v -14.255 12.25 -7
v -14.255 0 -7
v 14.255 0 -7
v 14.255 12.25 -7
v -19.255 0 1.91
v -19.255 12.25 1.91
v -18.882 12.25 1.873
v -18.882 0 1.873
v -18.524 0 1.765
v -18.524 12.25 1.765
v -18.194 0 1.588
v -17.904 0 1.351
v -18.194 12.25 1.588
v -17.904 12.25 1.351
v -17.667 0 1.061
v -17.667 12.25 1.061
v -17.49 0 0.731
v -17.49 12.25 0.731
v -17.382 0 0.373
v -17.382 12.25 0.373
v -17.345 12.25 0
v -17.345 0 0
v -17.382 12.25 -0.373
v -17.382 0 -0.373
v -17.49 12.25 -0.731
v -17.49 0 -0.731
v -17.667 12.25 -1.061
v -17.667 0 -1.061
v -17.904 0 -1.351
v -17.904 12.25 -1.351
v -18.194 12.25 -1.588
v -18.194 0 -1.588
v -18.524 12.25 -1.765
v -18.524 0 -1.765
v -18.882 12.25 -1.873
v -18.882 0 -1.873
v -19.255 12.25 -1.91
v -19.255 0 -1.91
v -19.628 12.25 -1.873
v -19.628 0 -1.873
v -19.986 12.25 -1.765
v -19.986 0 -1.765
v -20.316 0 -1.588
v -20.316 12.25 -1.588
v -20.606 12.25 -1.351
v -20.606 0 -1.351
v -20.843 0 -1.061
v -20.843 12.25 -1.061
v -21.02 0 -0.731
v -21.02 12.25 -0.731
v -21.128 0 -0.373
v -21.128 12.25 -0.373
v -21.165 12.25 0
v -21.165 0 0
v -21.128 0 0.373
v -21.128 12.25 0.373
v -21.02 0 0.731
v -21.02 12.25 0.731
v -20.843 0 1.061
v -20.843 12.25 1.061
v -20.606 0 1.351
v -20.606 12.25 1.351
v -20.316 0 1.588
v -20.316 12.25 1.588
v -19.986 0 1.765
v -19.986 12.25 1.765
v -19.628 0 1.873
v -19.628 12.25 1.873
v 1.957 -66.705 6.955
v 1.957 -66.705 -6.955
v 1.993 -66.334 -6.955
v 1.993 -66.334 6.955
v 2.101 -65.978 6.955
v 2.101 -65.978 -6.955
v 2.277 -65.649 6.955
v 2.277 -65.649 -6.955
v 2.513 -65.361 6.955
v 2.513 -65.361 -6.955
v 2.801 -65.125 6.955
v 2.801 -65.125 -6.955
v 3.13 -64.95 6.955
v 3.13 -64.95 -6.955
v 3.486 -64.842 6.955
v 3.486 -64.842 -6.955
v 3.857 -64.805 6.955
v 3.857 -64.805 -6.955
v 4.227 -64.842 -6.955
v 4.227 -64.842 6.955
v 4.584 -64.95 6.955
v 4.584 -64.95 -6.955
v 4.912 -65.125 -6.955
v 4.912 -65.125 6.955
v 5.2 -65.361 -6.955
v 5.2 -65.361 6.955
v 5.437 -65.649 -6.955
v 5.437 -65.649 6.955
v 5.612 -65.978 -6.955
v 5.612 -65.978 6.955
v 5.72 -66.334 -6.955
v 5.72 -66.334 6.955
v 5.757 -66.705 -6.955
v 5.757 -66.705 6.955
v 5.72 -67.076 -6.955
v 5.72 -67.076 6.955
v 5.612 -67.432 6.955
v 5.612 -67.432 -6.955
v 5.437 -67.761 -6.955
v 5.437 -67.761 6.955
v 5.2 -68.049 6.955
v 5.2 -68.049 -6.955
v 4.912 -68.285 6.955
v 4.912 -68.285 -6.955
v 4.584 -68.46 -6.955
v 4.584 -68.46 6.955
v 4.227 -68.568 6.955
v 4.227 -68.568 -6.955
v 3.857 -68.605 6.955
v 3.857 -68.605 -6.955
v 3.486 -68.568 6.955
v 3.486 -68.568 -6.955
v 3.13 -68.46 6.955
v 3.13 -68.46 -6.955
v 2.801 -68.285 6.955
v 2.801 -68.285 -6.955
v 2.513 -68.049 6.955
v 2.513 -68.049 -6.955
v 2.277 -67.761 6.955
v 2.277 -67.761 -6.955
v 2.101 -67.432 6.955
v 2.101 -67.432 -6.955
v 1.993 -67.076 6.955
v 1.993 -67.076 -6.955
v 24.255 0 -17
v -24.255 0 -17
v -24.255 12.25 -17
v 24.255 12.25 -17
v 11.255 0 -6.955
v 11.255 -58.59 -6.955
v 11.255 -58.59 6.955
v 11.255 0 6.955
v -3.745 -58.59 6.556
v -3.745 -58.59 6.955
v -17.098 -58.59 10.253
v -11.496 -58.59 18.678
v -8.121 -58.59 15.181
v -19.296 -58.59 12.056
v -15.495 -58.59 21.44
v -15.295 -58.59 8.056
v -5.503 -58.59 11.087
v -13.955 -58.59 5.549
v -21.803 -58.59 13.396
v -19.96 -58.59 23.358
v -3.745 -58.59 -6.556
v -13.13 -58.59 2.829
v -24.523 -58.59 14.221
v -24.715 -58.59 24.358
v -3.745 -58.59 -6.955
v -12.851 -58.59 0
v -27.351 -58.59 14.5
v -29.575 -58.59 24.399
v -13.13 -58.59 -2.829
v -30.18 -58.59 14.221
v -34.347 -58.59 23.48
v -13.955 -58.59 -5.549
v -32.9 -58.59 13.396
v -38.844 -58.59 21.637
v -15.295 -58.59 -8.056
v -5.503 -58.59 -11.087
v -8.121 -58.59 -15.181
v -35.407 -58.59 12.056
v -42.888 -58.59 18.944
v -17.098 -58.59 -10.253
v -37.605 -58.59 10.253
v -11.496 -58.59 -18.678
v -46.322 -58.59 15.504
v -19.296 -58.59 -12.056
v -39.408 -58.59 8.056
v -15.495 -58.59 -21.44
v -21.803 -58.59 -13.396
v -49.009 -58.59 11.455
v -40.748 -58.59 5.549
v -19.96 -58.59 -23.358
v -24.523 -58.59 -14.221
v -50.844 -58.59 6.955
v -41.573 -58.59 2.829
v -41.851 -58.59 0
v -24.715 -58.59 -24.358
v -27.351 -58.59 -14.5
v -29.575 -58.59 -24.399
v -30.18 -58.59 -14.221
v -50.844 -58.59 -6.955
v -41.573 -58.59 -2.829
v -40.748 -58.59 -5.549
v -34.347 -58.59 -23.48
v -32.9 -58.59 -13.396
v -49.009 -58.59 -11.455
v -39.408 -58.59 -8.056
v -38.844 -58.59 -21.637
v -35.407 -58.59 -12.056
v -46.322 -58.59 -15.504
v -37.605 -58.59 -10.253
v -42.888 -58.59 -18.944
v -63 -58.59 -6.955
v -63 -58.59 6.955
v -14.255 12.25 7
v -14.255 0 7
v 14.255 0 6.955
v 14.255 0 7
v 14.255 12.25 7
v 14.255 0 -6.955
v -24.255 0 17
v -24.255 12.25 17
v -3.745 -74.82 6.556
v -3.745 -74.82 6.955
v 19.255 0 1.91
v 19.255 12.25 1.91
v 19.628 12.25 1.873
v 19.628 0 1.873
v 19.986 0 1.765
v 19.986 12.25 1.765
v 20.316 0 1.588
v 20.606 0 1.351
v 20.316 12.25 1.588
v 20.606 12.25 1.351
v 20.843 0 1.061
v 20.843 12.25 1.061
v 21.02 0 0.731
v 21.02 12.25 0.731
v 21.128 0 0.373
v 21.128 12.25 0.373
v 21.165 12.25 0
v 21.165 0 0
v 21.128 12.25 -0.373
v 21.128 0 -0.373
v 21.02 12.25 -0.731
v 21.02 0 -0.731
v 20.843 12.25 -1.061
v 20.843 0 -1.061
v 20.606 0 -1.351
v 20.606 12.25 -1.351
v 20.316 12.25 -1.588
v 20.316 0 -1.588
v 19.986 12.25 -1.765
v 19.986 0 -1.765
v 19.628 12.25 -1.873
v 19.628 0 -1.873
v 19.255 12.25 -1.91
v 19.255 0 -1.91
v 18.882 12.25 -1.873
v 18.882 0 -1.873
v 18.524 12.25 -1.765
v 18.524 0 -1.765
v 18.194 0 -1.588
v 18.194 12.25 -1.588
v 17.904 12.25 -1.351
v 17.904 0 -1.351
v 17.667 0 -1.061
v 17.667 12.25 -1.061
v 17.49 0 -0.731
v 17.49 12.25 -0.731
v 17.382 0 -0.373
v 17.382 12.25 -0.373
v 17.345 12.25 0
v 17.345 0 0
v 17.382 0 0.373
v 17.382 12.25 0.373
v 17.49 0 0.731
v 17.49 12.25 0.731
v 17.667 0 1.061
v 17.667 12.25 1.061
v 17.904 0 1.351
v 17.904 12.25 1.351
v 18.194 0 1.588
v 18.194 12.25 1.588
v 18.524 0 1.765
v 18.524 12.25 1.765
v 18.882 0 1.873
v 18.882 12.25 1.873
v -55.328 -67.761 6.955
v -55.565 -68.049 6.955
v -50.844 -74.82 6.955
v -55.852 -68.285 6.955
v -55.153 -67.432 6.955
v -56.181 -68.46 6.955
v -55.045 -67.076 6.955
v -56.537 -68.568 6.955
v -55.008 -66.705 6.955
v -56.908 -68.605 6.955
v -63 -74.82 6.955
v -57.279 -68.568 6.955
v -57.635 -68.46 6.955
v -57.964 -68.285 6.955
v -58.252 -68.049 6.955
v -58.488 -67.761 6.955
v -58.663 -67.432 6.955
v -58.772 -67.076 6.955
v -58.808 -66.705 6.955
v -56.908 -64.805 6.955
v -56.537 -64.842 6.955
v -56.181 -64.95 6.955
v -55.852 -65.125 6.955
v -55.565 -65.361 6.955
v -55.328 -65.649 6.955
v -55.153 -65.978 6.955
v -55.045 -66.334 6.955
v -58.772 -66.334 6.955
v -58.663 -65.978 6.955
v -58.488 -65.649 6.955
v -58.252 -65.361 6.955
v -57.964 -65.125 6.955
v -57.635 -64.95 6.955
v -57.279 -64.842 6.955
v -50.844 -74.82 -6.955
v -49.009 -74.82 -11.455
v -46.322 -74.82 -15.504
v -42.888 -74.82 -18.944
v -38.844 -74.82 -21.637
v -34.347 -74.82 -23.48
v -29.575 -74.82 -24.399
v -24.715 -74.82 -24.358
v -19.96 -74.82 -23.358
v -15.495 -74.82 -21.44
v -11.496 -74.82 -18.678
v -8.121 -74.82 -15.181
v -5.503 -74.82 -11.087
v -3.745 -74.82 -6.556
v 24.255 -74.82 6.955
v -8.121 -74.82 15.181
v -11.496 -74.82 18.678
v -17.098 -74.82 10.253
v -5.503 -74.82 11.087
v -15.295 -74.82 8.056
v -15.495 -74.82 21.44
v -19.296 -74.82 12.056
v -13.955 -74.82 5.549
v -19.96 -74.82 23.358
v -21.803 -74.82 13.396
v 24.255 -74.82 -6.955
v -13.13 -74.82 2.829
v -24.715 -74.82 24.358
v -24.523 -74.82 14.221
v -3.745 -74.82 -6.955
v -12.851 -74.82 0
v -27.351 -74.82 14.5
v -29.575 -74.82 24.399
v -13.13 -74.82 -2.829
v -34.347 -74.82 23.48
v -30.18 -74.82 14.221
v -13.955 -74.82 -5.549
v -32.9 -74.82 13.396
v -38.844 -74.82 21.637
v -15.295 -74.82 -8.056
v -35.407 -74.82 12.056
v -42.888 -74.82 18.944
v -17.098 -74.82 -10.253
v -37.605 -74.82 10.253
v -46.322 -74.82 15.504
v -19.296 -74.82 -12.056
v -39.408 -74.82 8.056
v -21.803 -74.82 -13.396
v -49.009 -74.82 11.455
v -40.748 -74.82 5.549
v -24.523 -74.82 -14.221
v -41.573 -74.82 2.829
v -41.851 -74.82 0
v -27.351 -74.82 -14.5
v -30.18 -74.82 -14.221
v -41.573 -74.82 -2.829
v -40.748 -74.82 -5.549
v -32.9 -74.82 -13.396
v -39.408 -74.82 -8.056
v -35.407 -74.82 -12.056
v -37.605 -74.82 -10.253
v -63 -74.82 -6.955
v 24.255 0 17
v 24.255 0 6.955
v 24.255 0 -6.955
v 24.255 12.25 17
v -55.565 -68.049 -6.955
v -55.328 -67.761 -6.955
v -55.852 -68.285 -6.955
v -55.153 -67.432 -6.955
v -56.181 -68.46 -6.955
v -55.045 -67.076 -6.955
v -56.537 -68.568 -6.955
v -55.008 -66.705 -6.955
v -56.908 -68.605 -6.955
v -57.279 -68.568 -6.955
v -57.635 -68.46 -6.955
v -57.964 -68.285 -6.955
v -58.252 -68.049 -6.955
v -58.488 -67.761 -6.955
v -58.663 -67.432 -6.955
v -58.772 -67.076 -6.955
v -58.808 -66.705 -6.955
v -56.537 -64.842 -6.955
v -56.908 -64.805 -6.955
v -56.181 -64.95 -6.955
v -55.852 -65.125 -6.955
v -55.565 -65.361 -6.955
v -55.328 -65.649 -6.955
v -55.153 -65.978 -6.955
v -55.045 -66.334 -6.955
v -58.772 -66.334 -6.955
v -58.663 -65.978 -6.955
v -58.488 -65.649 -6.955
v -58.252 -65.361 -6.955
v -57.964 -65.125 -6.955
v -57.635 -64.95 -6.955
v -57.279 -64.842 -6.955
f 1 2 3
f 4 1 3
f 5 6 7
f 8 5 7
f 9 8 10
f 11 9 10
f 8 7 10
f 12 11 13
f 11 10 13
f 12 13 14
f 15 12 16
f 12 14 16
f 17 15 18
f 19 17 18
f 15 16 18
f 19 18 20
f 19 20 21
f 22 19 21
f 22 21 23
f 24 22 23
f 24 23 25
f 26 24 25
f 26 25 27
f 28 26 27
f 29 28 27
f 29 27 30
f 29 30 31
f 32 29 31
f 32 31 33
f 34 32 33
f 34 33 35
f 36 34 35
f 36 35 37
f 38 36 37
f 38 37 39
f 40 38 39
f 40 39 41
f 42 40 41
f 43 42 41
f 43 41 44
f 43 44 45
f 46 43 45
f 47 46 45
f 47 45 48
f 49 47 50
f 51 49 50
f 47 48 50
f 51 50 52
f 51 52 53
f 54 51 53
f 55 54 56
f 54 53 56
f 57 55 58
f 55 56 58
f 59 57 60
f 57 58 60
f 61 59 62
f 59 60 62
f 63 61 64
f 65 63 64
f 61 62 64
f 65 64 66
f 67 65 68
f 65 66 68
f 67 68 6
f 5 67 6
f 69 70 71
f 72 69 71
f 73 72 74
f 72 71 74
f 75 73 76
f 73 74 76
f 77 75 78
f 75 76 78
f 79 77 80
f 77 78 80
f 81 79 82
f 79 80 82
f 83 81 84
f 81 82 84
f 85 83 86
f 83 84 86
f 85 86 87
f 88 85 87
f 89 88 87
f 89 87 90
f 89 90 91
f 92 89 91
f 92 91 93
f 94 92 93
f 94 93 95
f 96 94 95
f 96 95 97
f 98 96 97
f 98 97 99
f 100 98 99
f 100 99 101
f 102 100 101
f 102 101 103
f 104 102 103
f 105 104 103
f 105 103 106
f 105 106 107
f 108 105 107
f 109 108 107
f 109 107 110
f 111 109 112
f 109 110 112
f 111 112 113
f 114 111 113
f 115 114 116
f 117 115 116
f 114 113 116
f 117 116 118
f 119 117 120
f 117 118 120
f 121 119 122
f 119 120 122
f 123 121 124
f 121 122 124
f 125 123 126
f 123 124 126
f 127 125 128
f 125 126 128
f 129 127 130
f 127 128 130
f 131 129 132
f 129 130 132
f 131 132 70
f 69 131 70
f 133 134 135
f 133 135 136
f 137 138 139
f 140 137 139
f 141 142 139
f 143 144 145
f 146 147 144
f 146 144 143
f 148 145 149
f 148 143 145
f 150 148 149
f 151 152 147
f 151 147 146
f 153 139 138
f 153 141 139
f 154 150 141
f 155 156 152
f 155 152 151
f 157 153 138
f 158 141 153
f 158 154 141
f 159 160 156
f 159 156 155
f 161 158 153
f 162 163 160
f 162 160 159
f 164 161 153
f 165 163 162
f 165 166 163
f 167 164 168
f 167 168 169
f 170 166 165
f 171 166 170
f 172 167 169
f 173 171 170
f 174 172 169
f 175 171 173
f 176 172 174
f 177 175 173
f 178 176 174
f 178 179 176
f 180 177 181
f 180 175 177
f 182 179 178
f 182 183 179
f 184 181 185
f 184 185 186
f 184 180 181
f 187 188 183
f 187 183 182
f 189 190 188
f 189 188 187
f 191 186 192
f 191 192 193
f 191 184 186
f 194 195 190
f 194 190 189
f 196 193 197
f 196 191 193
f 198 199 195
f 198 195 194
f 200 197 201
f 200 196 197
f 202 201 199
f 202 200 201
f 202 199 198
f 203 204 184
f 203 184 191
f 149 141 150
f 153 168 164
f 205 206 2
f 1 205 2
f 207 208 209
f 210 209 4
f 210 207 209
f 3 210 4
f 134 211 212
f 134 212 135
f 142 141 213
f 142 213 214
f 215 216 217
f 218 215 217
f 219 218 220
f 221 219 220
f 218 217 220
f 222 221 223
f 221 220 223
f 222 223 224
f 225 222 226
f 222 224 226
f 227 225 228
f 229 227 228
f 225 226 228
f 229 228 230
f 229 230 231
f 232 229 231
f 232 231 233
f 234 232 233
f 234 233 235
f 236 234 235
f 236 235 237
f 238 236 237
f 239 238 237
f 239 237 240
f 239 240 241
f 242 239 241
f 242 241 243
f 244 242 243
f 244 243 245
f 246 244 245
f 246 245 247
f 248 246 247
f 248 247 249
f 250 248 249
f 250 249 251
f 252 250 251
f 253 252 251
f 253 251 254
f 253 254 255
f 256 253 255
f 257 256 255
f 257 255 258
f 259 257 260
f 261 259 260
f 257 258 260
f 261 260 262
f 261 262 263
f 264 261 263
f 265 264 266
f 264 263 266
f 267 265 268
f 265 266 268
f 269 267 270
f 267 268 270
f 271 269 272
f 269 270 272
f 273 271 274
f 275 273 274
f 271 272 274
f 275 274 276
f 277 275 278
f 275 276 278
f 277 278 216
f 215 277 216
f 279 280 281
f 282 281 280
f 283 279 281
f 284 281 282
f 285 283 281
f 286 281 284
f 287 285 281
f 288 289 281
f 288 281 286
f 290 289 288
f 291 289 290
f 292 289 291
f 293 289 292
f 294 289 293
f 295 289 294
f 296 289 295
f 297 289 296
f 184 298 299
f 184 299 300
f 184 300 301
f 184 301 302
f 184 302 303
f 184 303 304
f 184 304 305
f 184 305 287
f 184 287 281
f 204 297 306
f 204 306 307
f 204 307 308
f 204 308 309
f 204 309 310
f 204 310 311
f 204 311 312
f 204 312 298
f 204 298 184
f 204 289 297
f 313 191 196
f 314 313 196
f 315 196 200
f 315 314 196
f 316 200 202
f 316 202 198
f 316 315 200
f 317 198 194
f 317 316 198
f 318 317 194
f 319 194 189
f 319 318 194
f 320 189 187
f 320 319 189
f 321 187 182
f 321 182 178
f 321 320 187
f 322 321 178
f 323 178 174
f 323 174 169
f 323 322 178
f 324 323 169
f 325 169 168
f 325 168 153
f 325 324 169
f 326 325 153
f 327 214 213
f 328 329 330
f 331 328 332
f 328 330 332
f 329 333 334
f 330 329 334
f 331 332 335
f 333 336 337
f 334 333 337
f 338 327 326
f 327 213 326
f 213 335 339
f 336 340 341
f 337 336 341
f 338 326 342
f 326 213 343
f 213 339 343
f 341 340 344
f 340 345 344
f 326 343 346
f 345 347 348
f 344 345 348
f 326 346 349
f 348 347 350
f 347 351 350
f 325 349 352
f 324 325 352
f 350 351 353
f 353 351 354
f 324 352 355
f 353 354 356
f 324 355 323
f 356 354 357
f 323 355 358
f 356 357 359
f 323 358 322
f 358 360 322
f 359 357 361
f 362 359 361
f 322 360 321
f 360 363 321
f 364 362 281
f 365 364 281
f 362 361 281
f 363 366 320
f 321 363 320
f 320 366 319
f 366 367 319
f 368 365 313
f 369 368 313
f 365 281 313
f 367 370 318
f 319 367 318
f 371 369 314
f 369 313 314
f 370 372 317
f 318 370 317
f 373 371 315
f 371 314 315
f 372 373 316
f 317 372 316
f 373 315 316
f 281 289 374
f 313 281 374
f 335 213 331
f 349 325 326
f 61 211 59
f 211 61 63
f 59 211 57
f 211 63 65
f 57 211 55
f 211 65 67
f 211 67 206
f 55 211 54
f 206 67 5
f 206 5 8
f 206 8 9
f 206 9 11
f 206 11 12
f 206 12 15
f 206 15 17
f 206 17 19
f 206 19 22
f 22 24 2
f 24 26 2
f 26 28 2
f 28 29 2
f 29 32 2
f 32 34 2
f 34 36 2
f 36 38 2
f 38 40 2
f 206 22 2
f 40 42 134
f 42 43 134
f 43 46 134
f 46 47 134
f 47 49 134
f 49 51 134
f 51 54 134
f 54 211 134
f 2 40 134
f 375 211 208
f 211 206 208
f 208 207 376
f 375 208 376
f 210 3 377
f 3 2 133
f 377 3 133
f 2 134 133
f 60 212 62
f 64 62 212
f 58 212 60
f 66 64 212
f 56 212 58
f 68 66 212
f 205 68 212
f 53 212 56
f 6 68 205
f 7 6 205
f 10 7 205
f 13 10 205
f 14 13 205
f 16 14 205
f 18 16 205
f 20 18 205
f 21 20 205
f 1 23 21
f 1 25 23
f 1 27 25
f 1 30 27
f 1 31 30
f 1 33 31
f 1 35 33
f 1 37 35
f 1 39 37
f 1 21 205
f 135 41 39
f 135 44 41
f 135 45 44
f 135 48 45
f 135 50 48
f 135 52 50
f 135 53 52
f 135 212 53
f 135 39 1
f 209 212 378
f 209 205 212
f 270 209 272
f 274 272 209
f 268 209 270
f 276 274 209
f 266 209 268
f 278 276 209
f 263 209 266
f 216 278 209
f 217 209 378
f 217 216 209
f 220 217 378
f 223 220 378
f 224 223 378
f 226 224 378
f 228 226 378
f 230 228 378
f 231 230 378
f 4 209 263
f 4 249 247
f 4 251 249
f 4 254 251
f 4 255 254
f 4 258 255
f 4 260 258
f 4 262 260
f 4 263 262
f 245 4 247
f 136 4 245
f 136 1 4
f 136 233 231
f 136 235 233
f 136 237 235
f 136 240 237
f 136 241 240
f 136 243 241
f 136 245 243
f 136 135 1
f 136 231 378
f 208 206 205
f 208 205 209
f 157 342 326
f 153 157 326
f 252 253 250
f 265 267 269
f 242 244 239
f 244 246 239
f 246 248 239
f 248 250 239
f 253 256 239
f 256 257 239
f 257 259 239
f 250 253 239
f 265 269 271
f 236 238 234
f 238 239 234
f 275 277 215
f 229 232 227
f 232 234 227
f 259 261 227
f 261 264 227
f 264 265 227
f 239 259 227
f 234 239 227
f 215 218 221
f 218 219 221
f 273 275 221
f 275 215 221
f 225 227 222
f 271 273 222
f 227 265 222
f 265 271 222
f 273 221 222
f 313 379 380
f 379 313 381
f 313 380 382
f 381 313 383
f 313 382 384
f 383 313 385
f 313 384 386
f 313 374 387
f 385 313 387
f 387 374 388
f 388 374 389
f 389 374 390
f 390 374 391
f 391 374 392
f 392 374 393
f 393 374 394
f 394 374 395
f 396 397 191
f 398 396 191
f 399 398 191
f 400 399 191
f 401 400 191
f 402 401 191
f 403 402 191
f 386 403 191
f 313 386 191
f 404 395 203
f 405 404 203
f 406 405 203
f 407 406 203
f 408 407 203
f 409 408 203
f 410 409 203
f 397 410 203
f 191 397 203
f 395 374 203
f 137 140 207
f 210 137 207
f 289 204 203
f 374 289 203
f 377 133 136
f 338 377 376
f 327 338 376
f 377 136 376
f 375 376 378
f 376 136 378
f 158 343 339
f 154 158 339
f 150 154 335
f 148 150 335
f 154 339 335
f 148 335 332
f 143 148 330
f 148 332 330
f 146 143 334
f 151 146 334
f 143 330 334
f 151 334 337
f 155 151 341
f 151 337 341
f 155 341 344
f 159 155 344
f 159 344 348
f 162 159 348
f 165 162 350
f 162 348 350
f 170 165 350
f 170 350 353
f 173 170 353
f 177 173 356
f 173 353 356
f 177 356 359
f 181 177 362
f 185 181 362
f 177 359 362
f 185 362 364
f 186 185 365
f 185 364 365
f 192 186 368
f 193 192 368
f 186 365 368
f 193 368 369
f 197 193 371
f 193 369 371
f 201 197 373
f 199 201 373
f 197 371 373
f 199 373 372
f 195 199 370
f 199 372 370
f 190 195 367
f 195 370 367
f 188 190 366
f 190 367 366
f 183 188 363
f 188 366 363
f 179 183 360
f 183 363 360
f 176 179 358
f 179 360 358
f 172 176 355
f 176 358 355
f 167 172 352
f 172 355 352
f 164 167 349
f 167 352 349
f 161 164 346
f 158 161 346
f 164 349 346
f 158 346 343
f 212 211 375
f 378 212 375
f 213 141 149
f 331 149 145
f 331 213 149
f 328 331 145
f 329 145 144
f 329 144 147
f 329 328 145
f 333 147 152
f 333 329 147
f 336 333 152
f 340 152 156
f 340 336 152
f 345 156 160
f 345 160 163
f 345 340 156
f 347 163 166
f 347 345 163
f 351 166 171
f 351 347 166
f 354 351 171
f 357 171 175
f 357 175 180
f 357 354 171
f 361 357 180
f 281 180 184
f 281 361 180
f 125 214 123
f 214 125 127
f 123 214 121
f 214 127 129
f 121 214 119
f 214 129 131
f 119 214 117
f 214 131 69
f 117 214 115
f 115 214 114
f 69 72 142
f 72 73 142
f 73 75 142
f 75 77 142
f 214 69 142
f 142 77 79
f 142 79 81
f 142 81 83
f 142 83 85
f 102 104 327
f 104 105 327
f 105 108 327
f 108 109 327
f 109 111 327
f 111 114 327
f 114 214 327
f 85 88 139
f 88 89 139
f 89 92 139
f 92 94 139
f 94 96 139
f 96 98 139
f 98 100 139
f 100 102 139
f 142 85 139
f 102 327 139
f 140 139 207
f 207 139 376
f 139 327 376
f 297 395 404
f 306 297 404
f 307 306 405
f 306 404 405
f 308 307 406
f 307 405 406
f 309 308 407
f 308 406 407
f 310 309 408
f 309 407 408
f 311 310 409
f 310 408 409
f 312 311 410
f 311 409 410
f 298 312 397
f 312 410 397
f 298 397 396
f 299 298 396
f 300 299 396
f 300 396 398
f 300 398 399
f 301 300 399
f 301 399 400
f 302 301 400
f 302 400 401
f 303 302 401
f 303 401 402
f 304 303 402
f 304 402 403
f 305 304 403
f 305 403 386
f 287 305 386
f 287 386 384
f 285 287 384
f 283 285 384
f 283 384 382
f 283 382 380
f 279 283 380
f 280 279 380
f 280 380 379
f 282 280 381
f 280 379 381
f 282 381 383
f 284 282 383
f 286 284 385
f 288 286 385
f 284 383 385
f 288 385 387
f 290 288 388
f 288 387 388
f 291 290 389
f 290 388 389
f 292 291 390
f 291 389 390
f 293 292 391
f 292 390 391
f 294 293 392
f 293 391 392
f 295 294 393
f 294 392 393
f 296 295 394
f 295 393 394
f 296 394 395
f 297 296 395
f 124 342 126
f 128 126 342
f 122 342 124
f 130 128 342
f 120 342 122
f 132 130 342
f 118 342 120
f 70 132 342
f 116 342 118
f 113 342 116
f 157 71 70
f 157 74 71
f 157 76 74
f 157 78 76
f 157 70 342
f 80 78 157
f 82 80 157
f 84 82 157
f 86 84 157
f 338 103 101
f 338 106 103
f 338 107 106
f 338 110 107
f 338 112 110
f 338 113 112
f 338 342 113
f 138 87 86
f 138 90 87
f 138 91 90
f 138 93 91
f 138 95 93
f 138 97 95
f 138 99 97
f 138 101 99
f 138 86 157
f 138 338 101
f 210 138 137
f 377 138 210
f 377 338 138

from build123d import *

# Parameters (mm, degrees)
SKETCH_1_W           = 48.51
SKETCH_1_H           = 34
SKETCH_1_W_2         = 28.51
SKETCH_1_H_2         = 14
EXTRUDE_1_DEPTH      = 12.25
SKETCH_2_R           = 1.91
CUT_EXTRUDE_1_DEPTH  = 33.05257439
SKETCH_4_W           = 13
SKETCH_4_H           = 13.91
EXTRUDE_1_2_DEPTH    = 74.82
SKETCH_5_W           = 13.91
SKETCH_5_H           = 16.23
EXTRUDE_2_DEPTH      = 15
SKETCH_7_R           = 24.5
SKETCH_7_R_2         = 14.5
EXTRUDE_2_2_DEPTH    = 16.23
SKETCH_12_R          = 1.9
CUT_EXTRUDE_4_DEPTH  = 97.312124675
EXTRUDE_3_DEPTH      = 10
EXTRUDE_3_DEPTH_BACK = 8
SKETCH_13_W          = 13.91
SKETCH_13_H          = 16.23
SKETCH_14_R          = 1.9
CUT_EXTRUDE_5_DEPTH  = 103.744583434


with BuildPart() as part:
    # 草圖1 → Extrude 1 (new body)
    with BuildSketch(Plane(origin=(0, 0, 0), x_dir=(1, 0, 0), z_dir=(0, 1, 0))):
        Rectangle(SKETCH_1_W, SKETCH_1_H)
        Rectangle(SKETCH_1_W_2, SKETCH_1_H_2, mode=Mode.SUBTRACT)
    extrude(amount=EXTRUDE_1_DEPTH)

    # 草圖2 → 除料-伸長1 (cut, through all)
    with BuildSketch(Plane(origin=(0, 12.25, 0), x_dir=(1, 0, 0), z_dir=(0, 1, 0))):
        with Locations(Location((-19.255, 0, 0), (0, 0, 270))):
            Circle(SKETCH_2_R)
        with Locations(Location((19.255, 0, 0), (0, 0, 270))):
            Circle(SKETCH_2_R)
    extrude(amount=-CUT_EXTRUDE_1_DEPTH, mode=Mode.SUBTRACT)

    # 草圖4 → Extrude 1 2 (add)
    with BuildSketch(Plane.XZ):
        with Locations((17.755, 0)):
            Rectangle(SKETCH_4_W, SKETCH_4_H)
    extrude(amount=EXTRUDE_1_2_DEPTH)

    # 草圖5 → Extrude 2 (add)
    with BuildSketch(Plane.ZY.offset(-11.255)):
        with Locations((0, -66.705)):
            Rectangle(SKETCH_5_W, SKETCH_5_H)
    extrude(amount=EXTRUDE_2_DEPTH)

    # 草圖7 → Extrude 2 2 (add)
    with BuildSketch(Plane(origin=(3.626674765, -74.82, 0), x_dir=(1, 0, 0), z_dir=(0, -1, 0))):
        with Locations((-30.978154344, 0)):
            Circle(SKETCH_7_R)
        with Locations((-30.978154344, 0)):
            Circle(SKETCH_7_R_2, mode=Mode.SUBTRACT)
    extrude(amount=-EXTRUDE_2_2_DEPTH)

    # 草圖12 → 除料-伸長4 (cut, through all)
    with BuildSketch(Plane(origin=(0, 0, -6.955), x_dir=(-1, 0, 0), z_dir=(0, 0, -1))):
        with Locations((-3.856713649, -66.705)):
            Circle(SKETCH_12_R)
    extrude(amount=-CUT_EXTRUDE_4_DEPTH, mode=Mode.SUBTRACT)

    # 草圖13 → 填料-伸長3 (add, two sides: drawn at the far end of the back side and taken through both)
    with BuildSketch(Plane(origin=(-55, 0, 0), x_dir=(0, 0, -1), z_dir=(1, 0, 0)).offset(-EXTRUDE_3_DEPTH_BACK)):
        with Locations((0, -66.705)):
            Rectangle(SKETCH_13_W, SKETCH_13_H)
    extrude(amount=EXTRUDE_3_DEPTH + EXTRUDE_3_DEPTH_BACK)

    # 草圖14 → 除料-伸長5 (cut, through all)
    with BuildSketch(Plane(origin=(0, 0, -6.955), x_dir=(-1, 0, 0), z_dir=(0, 0, -1))):
        with Locations((56.908040017, -66.705)):
            Circle(SKETCH_14_R)
    extrude(amount=-CUT_EXTRUDE_5_DEPTH, mode=Mode.SUBTRACT)


solid = part.part
